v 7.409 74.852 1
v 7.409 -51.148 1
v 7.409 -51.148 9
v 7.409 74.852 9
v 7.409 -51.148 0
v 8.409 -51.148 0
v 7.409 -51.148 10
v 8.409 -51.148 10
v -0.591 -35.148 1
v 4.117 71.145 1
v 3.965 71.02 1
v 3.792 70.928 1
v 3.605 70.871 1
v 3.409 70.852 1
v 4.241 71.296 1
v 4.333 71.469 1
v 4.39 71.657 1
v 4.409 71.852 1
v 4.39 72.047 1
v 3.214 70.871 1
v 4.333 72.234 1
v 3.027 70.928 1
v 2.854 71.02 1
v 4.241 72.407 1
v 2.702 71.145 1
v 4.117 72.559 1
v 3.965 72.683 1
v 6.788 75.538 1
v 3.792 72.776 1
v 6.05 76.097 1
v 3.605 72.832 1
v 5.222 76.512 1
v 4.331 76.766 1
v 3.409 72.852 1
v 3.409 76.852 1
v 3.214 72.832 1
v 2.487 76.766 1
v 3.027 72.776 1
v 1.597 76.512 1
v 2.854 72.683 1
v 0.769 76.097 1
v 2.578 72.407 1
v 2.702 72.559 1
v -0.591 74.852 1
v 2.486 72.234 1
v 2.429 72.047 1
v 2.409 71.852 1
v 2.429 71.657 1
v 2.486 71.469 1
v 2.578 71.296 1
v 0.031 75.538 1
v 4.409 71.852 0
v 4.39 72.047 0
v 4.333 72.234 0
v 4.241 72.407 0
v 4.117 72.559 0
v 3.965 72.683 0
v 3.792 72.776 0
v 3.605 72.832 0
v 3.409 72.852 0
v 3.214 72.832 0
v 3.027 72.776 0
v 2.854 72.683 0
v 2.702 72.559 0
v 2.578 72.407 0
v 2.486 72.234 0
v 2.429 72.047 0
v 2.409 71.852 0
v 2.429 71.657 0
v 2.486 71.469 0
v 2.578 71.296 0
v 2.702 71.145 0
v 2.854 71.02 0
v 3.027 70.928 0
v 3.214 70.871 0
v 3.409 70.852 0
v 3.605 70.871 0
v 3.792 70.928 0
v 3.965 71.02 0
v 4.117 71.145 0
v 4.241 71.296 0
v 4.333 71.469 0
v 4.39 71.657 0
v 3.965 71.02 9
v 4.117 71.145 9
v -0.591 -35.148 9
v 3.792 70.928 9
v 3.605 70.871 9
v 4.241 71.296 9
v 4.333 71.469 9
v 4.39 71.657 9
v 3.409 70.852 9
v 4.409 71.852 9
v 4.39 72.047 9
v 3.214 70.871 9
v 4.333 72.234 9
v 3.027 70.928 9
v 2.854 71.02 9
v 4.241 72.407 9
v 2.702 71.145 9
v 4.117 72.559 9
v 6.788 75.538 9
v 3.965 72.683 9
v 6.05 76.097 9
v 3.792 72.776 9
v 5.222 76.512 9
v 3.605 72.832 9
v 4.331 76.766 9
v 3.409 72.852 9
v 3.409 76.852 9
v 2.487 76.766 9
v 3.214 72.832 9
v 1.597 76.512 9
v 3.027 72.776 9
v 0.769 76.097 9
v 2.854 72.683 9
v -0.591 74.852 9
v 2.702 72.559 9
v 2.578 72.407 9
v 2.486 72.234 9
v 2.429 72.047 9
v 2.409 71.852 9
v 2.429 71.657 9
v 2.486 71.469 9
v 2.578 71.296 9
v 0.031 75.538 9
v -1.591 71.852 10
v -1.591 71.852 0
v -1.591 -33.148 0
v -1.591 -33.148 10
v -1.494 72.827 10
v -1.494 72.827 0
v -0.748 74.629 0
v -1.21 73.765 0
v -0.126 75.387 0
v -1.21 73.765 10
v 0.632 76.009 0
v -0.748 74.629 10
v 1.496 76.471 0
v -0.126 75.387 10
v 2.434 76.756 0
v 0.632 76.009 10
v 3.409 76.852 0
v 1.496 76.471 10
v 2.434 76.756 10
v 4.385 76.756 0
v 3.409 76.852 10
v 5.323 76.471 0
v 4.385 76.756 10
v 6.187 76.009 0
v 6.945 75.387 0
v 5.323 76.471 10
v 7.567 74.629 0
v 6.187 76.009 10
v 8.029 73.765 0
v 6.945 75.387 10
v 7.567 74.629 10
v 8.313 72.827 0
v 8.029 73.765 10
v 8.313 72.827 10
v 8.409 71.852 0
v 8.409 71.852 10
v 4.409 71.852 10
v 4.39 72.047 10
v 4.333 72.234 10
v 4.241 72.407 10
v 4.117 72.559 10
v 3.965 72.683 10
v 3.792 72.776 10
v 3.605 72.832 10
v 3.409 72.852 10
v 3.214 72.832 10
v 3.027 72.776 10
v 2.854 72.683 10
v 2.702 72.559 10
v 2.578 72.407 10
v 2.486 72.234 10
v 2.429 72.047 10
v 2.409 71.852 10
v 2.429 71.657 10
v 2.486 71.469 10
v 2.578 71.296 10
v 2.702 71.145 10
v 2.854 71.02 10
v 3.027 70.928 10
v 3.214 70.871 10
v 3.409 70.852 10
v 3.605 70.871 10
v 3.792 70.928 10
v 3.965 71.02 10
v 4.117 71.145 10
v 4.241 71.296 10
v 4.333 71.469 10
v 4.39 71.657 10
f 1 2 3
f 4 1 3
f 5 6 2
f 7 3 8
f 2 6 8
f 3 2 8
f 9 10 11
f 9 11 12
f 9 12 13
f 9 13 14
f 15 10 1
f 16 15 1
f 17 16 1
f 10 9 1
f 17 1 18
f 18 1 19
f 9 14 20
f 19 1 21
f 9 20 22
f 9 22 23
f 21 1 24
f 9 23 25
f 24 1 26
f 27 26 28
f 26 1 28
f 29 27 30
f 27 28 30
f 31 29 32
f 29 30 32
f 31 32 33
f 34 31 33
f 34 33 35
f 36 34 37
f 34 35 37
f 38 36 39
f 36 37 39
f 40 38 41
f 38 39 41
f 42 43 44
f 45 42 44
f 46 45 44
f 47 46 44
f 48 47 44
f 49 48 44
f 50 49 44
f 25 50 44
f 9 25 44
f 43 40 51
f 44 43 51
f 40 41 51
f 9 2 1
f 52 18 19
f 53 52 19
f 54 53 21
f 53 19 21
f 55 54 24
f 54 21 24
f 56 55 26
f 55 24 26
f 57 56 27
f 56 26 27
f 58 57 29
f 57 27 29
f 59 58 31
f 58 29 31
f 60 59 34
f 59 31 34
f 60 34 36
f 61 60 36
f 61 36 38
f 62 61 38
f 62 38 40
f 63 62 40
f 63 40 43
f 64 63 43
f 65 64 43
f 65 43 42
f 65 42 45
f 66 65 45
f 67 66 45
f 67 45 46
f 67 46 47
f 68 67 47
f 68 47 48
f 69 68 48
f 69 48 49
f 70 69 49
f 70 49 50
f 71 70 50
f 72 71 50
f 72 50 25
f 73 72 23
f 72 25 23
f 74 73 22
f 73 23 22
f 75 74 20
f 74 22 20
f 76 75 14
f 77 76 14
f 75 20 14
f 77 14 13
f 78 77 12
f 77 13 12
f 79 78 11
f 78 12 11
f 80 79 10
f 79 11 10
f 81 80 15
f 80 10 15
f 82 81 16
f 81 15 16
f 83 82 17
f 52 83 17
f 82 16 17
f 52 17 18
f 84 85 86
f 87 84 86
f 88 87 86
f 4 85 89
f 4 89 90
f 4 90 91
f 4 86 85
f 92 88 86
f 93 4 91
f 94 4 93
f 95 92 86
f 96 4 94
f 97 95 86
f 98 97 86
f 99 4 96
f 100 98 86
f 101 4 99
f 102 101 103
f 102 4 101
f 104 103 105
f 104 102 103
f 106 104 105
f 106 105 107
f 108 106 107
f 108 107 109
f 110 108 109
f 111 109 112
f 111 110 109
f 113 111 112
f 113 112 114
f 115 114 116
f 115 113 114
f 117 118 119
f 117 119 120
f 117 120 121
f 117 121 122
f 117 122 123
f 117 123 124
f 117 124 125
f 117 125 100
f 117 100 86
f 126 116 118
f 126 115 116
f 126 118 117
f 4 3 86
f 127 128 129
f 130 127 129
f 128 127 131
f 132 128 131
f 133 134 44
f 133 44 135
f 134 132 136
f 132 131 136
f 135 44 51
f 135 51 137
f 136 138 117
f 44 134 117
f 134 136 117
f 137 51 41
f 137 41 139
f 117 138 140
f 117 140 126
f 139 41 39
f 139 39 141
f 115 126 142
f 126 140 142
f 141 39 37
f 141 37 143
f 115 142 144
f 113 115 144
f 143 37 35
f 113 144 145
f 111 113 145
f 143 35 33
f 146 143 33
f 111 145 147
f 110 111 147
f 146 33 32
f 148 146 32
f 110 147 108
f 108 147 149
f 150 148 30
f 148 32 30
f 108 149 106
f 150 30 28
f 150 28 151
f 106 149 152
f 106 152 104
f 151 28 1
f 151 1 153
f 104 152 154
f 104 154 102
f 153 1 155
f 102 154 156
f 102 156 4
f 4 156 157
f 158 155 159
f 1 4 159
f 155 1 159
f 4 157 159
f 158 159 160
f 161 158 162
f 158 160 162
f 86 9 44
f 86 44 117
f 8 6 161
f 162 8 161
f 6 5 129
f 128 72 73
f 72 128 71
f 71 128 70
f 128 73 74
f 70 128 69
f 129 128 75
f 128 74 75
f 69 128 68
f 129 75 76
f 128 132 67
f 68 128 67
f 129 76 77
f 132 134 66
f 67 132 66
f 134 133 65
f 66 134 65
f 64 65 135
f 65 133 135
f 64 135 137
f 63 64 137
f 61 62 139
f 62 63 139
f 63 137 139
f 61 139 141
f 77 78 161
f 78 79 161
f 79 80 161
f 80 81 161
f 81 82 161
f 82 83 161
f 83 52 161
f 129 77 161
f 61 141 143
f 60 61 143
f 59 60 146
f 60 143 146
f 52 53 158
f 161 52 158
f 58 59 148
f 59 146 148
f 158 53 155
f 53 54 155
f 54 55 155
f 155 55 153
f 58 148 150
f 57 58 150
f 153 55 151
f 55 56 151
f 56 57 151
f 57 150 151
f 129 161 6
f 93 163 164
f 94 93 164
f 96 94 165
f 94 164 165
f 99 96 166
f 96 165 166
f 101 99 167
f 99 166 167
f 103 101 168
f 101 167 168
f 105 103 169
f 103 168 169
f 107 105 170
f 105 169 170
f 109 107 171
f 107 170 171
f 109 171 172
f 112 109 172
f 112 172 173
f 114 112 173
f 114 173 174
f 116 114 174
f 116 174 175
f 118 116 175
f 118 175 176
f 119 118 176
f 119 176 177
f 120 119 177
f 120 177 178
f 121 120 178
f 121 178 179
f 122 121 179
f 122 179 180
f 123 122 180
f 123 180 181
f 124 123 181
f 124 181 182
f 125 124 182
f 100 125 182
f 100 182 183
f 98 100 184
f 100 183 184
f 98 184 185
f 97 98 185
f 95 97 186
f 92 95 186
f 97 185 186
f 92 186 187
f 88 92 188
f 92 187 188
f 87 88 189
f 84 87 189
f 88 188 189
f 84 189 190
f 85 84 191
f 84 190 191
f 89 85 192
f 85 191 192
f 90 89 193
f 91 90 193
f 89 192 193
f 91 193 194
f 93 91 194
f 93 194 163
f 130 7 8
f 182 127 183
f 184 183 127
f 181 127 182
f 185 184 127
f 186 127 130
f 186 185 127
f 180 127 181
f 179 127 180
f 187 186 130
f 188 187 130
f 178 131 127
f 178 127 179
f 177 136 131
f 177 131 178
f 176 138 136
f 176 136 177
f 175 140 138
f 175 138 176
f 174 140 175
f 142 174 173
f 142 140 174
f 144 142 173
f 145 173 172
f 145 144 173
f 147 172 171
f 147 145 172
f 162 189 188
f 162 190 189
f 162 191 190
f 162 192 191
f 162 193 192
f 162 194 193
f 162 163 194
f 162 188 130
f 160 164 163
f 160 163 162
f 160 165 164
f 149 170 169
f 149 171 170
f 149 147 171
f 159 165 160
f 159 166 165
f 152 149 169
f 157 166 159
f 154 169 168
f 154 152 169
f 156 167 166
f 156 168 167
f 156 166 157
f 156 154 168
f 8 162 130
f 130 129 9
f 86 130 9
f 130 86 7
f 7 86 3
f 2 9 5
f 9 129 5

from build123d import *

# Parameters (mm, degrees)
F1_DEPTH = 10
F2_W     = 8
F2_H     = 8
F3_DEPTH = 150
F4_R     = 1
F5_DEPTH = 25
F6_W     = 2
F6_H     = 10
F7_DEPTH = 25


with BuildPart() as f1:
    # F0 (on Top) → F1 (new body)
    with BuildSketch(Plane.XY):
        Polygon((8.409432, 76.851626), (-1.590568, 76.851626), (-1.590568, -33.148374), (8.409432, -53.148374), align=None)
    extrude(amount=F1_DEPTH)

    # F2 (on face) → F3 (cut)
    with BuildSketch(Plane(origin=(0, 76.851626, 0), x_dir=(-1, 0, 0), z_dir=(0, 1, 0))):
        with Locations((-3.409432, 5)):
            Rectangle(F2_W, F2_H)
    extrude(amount=-F3_DEPTH, mode=Mode.SUBTRACT)

    # F4 (on face) → F5 (cut)
    with BuildSketch(Plane.XY.offset(10)):
        with BuildLine():
            ThreePointArc((-1.590568, 71.851626), (3.409432, 76.851626), (8.409432, 71.851626))
            Line((8.409432, 71.851626), (14.622306, 71.851626))
            Line((14.622306, 71.851626), (14.622306, 78.704596))
            Line((14.622306, 78.704596), (-2.961113, 78.068092))
            Line((-2.961113, 78.068092), (-2.736083, 71.851626))
            Line((-2.736083, 71.851626), (-1.590568, 71.851626))
        make_face()
        with Locations((3.409432, 71.851626)):
            Circle(F4_R)
    extrude(amount=-F5_DEPTH, mode=Mode.SUBTRACT)

    # F6 (on face) → F7 (cut)
    with BuildSketch(Plane.YZ.offset(8.409432)):
        Polygon((-51.148374, 19.7851), (-54.233824, 19.7851), (-54.233824, -10.105174), (-51.148374, -10.105174), (-51.148374, 0), (-53.148374, 0), (-53.148374, 10), (-51.148374, 10), align=None)
        with Locations((-52.148374, 5)):
            Rectangle(F6_W, F6_H)
    extrude(amount=-F7_DEPTH, mode=Mode.SUBTRACT)


solid = f1.part
